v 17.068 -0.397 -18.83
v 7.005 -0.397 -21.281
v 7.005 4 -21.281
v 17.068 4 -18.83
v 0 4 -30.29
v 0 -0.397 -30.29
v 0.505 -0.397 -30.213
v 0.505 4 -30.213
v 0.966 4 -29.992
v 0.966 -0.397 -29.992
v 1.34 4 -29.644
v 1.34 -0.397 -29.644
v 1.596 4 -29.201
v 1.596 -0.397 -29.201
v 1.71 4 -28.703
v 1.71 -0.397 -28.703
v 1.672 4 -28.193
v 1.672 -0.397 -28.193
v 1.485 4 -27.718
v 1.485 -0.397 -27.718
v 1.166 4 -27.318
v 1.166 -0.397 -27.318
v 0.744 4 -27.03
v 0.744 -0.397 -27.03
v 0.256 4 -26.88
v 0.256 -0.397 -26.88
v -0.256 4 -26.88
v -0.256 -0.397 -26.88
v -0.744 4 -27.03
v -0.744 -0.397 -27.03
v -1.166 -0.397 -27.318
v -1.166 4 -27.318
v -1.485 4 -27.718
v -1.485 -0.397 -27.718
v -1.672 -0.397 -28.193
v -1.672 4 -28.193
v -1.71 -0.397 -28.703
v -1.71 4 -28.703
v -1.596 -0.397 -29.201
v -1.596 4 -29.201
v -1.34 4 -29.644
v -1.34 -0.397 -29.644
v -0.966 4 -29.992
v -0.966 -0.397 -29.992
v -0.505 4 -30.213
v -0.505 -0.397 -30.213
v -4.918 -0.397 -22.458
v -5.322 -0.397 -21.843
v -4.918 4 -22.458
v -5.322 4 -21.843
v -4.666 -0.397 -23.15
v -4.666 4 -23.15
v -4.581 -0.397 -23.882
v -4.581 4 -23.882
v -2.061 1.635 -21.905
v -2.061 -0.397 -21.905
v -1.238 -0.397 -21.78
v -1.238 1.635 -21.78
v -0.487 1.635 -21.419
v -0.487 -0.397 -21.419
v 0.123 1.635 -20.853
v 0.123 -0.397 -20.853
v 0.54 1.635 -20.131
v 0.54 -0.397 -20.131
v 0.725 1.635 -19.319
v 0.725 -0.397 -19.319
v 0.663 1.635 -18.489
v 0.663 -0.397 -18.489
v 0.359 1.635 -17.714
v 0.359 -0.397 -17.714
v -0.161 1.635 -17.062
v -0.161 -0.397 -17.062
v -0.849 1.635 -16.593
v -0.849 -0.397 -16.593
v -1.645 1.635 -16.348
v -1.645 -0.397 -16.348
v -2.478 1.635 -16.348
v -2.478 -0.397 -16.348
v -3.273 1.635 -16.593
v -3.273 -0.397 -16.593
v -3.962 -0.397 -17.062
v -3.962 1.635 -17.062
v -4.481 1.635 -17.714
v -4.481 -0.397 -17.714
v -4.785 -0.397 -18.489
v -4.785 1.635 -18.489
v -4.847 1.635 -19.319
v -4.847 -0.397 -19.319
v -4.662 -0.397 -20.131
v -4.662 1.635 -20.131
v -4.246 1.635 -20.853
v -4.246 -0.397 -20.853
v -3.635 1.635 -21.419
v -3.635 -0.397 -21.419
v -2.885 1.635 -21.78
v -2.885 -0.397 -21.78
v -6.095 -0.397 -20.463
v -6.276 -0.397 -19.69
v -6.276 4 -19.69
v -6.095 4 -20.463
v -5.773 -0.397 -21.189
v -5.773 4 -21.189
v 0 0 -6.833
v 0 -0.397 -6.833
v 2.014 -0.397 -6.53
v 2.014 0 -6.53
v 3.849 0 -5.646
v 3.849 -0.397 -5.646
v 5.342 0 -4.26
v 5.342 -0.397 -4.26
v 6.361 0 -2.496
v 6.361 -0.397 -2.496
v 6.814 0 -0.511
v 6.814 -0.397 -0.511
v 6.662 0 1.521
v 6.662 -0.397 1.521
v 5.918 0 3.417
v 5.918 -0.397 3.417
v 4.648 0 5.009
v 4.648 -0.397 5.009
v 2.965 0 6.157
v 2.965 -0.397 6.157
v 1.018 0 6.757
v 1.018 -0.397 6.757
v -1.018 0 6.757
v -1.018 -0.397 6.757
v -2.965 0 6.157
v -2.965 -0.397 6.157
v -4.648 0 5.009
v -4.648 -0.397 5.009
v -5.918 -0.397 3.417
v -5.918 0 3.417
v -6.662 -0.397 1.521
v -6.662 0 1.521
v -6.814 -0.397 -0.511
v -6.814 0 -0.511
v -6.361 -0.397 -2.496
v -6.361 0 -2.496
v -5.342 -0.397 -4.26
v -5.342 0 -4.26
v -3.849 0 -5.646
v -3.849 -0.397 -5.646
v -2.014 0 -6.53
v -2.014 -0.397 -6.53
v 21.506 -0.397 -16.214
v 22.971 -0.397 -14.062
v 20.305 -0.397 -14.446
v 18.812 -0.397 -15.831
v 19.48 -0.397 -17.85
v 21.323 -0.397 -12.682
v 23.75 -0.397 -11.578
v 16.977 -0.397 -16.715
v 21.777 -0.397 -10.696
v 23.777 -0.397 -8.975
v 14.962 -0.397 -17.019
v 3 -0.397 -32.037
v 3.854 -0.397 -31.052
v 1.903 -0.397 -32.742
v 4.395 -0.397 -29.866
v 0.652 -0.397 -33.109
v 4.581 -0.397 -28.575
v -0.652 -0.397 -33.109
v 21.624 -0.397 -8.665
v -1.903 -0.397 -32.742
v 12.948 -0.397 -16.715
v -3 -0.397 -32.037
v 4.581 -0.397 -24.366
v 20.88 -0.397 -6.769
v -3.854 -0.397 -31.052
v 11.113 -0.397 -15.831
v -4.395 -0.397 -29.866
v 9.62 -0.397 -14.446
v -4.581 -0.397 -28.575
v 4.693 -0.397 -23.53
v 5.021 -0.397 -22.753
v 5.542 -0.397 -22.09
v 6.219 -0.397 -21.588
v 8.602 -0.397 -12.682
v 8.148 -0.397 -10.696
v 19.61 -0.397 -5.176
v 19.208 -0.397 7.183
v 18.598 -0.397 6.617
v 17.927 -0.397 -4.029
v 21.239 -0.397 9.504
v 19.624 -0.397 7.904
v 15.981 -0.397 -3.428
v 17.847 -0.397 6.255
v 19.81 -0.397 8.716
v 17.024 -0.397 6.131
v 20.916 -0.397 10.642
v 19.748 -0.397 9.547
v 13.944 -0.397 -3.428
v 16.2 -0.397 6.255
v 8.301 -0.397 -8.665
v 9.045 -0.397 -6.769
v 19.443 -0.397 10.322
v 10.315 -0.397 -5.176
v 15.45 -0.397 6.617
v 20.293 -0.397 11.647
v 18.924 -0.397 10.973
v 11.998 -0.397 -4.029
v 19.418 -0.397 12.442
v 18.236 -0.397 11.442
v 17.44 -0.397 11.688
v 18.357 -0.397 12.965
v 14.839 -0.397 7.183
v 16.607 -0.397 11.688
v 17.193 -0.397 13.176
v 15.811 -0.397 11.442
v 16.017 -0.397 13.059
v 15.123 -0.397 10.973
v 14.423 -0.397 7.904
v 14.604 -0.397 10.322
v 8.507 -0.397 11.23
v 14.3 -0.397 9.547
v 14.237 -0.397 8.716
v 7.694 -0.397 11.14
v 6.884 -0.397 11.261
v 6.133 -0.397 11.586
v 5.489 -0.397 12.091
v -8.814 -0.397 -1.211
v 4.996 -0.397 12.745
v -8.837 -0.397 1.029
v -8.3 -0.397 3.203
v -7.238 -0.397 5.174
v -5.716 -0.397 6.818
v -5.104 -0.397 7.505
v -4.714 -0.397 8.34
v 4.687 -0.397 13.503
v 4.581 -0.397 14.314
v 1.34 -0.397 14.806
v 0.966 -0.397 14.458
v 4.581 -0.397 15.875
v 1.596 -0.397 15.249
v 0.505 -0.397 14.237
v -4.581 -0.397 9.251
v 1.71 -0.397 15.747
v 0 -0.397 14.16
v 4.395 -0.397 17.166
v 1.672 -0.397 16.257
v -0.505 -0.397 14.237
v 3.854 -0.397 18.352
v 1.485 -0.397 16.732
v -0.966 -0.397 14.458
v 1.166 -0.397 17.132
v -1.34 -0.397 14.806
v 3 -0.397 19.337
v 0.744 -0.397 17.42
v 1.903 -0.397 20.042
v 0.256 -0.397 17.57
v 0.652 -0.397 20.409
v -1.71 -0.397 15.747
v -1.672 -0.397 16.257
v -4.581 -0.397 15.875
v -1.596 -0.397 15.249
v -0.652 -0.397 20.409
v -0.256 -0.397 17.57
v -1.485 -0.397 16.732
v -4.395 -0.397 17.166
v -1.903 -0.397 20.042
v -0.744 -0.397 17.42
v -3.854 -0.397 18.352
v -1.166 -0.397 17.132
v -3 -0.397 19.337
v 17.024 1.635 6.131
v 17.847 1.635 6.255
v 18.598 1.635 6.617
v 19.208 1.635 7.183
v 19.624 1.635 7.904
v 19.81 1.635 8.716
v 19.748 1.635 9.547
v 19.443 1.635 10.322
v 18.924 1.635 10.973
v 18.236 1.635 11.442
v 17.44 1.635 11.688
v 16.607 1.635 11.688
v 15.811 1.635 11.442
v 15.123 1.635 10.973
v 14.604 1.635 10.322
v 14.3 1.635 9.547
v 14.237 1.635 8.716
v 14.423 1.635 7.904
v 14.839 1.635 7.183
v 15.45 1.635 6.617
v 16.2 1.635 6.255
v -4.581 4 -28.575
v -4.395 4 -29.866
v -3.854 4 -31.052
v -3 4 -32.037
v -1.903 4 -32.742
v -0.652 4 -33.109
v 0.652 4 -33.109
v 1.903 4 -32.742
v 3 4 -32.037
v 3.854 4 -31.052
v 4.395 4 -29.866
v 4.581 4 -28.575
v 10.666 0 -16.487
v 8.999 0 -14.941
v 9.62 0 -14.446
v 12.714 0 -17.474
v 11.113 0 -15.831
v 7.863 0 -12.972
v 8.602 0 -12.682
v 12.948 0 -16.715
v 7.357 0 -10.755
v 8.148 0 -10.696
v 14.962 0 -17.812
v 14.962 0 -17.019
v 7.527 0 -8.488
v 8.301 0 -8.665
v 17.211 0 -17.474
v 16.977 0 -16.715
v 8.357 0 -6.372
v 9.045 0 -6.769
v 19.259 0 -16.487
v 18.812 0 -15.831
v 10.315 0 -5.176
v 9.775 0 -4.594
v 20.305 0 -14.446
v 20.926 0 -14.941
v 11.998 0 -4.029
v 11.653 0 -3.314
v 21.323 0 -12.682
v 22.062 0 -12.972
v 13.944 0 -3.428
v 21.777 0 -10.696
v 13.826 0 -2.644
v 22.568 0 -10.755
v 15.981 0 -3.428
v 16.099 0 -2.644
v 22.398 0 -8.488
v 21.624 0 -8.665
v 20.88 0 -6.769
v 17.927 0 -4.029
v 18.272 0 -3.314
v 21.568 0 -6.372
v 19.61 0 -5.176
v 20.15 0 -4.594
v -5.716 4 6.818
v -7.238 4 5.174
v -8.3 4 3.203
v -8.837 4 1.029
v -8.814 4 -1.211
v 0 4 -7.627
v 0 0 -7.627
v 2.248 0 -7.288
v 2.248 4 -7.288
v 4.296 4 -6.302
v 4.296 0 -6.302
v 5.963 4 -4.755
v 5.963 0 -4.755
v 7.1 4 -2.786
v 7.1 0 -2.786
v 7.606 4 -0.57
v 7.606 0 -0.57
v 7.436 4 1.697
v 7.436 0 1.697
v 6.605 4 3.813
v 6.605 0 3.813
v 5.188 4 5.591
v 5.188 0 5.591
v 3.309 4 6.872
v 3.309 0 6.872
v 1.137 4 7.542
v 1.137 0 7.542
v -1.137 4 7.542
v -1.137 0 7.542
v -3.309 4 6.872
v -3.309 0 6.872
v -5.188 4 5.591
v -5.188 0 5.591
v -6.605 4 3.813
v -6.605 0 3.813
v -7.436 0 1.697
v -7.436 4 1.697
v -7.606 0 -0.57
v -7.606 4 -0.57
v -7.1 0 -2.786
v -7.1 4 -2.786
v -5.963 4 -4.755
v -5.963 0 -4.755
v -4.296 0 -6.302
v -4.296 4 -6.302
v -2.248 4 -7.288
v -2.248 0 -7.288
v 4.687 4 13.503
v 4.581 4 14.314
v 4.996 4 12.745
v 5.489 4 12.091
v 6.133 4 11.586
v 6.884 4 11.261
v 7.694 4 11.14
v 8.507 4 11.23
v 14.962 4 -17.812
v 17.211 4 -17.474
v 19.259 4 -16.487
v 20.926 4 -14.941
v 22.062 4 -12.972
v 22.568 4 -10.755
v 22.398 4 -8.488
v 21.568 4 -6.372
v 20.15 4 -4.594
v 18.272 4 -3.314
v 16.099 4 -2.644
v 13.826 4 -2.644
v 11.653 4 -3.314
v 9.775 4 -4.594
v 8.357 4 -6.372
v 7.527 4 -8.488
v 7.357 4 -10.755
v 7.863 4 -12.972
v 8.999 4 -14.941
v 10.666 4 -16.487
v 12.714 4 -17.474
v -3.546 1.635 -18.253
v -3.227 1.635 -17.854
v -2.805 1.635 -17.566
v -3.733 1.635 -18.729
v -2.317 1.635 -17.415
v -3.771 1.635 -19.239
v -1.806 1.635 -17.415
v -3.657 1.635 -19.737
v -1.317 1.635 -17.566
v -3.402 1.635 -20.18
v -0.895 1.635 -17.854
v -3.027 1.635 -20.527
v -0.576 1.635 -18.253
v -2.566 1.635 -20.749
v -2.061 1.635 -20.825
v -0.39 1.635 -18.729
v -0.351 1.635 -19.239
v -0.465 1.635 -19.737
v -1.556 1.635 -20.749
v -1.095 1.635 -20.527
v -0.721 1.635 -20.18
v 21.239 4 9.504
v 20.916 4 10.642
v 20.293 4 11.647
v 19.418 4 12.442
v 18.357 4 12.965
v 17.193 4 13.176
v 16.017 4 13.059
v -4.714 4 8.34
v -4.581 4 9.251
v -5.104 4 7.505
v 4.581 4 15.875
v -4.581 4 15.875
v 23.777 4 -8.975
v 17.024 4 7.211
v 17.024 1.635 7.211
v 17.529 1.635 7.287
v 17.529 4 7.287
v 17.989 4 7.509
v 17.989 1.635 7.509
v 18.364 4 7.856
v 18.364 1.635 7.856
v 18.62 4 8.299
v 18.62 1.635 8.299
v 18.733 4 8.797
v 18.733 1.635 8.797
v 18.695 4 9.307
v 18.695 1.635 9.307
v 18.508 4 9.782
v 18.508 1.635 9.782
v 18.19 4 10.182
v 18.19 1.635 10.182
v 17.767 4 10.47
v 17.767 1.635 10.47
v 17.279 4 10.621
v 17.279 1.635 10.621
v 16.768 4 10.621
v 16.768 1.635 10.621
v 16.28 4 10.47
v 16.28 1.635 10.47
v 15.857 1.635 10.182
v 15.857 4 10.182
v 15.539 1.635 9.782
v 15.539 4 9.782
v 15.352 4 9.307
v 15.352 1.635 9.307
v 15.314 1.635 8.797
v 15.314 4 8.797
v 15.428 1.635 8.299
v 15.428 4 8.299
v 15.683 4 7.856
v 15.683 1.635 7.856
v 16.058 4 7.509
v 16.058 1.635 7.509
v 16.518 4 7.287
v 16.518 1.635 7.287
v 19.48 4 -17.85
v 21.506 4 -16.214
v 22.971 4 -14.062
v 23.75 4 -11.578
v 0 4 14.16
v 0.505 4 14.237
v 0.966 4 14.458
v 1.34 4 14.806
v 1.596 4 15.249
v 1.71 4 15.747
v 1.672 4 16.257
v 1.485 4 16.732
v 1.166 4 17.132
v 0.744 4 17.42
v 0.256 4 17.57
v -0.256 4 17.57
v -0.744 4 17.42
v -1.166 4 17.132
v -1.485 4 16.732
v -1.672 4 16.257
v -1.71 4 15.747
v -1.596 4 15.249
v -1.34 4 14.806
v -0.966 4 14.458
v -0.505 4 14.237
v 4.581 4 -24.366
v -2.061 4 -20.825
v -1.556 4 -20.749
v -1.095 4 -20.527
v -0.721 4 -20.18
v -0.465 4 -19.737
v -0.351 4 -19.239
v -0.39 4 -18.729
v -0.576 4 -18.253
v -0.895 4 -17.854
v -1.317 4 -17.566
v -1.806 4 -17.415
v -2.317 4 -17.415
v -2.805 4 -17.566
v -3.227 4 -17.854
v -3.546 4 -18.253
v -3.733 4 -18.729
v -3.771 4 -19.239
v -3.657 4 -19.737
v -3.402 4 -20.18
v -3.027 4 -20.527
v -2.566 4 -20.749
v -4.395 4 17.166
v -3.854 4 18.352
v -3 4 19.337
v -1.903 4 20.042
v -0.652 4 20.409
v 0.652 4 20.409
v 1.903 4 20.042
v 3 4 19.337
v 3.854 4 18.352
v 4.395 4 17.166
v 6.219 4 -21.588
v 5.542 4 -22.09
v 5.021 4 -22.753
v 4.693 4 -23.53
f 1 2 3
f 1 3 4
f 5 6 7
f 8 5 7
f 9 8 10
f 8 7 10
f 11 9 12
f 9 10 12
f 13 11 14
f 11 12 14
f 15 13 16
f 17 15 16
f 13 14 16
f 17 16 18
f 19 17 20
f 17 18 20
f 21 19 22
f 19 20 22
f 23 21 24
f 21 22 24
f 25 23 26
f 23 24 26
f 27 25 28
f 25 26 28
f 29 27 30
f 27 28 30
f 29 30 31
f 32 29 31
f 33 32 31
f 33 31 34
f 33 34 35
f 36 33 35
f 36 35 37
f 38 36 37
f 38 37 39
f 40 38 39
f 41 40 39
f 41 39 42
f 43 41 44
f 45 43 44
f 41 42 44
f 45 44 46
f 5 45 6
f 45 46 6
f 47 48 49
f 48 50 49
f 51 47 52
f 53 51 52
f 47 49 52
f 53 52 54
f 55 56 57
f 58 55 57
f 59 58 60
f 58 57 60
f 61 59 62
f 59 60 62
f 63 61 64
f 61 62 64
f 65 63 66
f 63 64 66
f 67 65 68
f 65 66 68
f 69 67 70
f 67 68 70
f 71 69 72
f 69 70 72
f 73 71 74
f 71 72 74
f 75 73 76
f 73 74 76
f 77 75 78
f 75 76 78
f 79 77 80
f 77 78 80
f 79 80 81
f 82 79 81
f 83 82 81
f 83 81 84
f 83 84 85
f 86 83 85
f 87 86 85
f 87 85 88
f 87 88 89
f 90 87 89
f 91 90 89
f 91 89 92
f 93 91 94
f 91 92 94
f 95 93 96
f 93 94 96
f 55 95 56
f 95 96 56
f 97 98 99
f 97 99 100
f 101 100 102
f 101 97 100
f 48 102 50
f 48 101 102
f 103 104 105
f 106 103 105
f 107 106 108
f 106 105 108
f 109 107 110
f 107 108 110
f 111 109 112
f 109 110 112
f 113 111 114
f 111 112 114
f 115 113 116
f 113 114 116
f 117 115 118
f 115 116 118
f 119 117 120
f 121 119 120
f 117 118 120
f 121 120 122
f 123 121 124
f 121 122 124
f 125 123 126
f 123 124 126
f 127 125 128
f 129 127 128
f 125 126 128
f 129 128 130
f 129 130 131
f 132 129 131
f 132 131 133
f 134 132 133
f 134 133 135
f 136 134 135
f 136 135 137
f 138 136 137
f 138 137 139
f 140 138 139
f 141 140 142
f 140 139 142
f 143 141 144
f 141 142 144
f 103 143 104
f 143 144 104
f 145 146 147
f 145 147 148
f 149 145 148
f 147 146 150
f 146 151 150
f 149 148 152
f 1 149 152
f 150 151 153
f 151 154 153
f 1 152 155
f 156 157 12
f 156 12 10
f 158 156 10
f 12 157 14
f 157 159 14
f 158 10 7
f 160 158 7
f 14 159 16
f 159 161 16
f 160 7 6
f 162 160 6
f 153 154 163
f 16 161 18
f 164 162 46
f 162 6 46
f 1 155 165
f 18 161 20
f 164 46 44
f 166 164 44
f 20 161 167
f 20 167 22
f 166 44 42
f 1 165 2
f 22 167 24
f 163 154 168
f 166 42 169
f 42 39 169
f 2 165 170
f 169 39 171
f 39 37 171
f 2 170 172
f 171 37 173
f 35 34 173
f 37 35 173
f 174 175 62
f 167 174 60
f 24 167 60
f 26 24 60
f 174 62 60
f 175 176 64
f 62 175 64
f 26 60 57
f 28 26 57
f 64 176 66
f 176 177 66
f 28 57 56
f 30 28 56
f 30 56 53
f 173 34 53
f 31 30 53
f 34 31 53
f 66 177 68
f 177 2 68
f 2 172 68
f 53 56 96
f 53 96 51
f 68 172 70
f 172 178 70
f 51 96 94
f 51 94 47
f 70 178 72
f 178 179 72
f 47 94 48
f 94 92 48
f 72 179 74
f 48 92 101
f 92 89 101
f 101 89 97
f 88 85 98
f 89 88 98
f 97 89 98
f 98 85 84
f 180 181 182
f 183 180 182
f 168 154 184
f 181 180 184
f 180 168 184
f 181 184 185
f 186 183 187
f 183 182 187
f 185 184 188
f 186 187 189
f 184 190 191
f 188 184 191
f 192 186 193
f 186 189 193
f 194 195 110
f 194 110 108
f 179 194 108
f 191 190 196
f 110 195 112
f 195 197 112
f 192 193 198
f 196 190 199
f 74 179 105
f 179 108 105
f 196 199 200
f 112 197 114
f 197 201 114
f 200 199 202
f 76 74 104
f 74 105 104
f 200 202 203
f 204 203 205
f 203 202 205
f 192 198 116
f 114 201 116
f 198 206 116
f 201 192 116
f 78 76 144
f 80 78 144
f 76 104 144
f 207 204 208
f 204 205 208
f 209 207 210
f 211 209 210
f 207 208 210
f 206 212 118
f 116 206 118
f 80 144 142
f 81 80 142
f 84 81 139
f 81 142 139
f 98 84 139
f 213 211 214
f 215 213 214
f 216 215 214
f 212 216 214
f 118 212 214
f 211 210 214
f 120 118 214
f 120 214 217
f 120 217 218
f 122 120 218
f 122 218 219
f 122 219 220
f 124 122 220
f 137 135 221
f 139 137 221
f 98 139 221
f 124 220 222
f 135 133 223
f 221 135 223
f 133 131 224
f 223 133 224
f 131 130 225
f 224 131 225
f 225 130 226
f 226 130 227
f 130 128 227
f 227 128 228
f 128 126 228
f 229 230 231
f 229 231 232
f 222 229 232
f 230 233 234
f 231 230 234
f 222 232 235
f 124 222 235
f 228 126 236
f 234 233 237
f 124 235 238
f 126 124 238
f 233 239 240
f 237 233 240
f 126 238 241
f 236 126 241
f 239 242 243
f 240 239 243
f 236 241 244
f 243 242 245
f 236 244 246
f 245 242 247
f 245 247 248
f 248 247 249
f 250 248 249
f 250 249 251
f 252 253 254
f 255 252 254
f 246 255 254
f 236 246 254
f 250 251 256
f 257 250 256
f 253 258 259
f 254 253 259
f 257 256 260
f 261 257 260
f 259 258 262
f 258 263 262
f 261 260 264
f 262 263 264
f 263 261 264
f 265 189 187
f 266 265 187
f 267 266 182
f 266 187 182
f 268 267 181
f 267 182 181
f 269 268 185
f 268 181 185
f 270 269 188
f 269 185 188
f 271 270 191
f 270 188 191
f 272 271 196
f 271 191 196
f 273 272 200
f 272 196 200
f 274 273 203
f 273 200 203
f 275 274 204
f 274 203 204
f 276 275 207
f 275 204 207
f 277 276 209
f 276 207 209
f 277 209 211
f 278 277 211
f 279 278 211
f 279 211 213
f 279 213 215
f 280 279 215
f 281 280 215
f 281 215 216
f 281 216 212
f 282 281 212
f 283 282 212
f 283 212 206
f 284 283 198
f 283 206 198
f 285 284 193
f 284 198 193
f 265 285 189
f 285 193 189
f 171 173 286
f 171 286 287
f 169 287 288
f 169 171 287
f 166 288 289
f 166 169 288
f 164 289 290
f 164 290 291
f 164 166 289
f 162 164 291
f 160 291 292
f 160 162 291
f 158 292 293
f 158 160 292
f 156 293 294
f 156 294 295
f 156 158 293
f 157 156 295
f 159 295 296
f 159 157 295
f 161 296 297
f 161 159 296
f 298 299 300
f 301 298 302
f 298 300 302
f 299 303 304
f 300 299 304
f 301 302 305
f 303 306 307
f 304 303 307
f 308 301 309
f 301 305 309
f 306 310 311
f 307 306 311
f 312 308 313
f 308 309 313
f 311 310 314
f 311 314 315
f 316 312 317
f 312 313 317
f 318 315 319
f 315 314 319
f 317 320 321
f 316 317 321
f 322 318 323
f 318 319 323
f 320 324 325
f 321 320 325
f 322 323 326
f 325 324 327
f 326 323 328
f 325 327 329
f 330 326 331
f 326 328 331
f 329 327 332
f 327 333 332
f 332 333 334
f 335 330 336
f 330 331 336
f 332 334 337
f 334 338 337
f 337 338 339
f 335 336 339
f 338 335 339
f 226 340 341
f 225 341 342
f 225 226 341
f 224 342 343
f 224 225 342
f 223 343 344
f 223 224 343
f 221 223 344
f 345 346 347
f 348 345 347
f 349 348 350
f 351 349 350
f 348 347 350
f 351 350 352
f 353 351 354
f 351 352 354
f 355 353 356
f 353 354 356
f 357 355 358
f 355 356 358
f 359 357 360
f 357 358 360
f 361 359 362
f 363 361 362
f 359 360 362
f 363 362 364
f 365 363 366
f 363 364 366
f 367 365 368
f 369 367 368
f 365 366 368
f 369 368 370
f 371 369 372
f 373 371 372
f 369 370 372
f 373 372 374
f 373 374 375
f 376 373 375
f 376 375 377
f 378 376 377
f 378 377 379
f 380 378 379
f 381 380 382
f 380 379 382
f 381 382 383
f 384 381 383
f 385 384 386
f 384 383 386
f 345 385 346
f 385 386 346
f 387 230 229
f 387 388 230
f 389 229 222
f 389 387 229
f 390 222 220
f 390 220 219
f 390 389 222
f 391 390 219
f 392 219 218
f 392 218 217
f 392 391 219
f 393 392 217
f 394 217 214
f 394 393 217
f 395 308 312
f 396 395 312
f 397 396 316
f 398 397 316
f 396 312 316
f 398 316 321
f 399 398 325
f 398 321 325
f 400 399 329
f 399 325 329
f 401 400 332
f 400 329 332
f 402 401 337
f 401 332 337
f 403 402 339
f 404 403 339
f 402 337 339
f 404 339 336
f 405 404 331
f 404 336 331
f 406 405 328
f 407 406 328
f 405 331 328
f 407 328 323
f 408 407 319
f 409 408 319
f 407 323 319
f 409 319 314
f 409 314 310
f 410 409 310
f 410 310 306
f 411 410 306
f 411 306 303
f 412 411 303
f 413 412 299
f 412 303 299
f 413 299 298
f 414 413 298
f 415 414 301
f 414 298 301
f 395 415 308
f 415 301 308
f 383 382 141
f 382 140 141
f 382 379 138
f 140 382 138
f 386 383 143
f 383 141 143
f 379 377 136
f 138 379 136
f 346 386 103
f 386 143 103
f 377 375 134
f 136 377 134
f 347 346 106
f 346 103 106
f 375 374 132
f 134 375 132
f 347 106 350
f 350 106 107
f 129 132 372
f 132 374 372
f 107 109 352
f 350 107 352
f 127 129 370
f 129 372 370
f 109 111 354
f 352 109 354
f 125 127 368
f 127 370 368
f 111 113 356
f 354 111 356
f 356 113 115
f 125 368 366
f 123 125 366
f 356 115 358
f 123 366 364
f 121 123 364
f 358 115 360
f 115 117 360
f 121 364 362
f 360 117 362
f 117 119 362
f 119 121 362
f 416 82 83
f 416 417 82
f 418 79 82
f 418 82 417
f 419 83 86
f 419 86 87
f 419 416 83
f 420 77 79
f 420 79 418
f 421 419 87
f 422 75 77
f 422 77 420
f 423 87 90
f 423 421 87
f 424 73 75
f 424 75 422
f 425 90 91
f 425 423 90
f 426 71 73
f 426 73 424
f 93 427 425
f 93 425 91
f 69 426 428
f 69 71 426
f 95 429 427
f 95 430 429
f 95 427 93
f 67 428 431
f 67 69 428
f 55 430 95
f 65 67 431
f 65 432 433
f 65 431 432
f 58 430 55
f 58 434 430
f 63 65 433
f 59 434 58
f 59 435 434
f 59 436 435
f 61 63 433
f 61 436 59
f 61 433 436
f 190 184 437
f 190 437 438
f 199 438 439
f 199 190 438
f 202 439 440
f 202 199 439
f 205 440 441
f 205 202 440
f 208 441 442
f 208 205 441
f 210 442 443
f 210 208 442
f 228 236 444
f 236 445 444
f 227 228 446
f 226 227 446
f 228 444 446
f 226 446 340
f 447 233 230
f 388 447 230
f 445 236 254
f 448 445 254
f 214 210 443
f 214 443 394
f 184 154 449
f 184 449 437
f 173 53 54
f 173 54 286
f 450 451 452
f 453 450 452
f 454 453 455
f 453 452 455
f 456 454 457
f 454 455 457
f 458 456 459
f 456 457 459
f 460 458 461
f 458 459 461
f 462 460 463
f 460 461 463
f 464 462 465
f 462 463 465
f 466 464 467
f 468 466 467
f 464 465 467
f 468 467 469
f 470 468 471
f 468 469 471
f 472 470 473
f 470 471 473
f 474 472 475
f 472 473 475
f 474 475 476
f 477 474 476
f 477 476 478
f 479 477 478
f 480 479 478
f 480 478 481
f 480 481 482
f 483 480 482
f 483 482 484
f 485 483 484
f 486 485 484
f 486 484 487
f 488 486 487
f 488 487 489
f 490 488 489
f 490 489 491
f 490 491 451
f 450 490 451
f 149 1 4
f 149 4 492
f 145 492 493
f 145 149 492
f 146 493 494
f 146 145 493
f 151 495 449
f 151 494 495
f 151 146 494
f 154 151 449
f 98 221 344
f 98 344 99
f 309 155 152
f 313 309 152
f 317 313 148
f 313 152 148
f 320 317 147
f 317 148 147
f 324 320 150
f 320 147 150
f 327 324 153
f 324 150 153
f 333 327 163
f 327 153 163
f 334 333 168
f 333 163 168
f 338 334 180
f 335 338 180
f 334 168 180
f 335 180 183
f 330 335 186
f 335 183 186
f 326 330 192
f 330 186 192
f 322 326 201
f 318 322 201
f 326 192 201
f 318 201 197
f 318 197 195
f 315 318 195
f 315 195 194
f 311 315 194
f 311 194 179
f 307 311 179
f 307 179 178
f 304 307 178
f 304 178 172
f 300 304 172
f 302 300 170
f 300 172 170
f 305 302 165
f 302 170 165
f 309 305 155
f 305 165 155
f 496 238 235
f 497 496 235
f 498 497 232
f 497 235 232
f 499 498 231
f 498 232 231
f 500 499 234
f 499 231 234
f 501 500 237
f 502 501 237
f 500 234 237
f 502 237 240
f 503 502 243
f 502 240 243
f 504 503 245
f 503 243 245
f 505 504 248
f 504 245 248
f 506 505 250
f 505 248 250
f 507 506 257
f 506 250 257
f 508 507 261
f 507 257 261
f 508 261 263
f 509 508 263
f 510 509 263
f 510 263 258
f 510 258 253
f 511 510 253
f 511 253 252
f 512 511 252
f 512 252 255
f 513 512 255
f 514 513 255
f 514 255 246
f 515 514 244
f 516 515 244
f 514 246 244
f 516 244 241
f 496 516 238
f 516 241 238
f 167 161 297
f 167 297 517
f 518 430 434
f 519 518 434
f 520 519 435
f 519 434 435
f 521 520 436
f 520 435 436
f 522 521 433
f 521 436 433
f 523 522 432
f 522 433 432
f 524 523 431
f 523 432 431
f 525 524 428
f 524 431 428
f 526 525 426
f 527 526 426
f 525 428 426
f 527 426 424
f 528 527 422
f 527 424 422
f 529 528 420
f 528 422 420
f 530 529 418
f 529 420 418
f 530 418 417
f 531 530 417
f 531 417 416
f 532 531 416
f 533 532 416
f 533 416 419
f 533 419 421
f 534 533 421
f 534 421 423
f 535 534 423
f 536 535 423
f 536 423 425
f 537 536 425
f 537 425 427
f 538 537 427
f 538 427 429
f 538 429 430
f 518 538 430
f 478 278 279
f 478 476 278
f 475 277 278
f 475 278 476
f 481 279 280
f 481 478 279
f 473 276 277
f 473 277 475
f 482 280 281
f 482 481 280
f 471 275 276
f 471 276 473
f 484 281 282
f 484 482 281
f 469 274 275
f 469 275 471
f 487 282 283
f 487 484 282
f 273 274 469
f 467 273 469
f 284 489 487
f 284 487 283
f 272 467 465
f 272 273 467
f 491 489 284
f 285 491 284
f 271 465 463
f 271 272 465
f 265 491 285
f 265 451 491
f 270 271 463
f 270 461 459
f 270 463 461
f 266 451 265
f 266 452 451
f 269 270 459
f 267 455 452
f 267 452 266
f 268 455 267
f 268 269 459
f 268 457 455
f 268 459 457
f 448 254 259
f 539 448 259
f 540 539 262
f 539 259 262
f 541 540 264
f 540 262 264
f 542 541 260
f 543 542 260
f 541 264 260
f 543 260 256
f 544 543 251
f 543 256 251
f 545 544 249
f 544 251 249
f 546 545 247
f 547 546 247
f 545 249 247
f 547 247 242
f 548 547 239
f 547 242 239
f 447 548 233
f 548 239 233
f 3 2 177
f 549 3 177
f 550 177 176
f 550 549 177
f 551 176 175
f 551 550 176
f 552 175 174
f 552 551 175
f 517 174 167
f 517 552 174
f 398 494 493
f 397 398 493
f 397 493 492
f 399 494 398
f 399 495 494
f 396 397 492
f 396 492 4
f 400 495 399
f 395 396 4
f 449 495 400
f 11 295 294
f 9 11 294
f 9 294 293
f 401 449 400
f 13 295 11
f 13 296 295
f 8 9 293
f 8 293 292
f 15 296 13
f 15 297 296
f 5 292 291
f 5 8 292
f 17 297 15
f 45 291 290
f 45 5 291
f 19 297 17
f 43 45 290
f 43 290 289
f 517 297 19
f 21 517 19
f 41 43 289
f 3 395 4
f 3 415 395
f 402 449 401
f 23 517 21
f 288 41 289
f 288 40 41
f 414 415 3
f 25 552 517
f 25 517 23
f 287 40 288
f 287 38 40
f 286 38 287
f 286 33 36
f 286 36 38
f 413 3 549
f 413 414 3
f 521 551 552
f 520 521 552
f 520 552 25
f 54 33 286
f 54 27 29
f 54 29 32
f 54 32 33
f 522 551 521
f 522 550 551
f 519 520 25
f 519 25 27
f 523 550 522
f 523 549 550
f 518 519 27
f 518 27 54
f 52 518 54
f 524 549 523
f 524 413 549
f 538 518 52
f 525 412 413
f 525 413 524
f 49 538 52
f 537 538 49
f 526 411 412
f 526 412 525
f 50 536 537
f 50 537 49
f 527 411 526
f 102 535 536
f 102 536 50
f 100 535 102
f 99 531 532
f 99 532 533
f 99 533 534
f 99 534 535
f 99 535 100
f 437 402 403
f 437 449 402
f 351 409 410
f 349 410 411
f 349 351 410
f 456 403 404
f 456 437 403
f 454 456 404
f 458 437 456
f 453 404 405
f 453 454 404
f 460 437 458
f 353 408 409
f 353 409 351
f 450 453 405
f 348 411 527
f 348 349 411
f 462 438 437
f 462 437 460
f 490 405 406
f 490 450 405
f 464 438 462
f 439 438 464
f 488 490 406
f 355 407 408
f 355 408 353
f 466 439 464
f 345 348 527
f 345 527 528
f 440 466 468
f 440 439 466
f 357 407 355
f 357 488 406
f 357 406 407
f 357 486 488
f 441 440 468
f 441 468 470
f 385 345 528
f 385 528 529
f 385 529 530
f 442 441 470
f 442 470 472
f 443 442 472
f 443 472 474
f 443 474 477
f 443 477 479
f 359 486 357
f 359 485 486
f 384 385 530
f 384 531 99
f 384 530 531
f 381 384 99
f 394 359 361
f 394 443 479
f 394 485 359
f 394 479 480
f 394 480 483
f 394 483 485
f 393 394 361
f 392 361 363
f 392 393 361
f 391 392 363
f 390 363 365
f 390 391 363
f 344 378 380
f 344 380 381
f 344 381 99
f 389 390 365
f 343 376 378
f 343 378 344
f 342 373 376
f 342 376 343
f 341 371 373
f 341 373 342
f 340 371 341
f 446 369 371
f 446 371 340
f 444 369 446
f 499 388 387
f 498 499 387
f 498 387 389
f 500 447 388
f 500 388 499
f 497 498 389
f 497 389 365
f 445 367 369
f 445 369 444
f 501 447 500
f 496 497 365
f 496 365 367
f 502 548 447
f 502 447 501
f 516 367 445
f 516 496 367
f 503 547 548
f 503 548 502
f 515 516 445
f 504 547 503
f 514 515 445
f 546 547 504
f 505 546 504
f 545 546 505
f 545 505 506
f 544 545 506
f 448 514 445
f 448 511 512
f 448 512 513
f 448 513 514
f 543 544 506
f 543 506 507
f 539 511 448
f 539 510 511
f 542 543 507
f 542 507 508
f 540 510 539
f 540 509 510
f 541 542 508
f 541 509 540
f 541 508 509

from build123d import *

# Parameters (mm, degrees)
SKETCH1_R           = 7.626999986
SKETCH1_R_2         = 1.7145
BOSS_EXTRUDE1_DEPTH = 4.000000128
BOSS_EXTRUDE2_START = 0.396875
SKETCH2_R           = 6.833249986
BOSS_EXTRUDE2_DEPTH = 0.396875
SKETCH3_R           = 2.794
CUT_EXTRUDE1_DEPTH  = 2.032
SKETCH6_R           = 1.7145
BOSS_EXTRUDE5_DEPTH = 4.396875128
FILLET1_R           = 3.175


with BuildPart() as part:
    # Sketch1 → Boss-Extrude1 (new body)
    with BuildSketch(Plane(origin=(0, 0, 0), x_dir=(-1, 0, 0), z_dir=(0, -1, 0))):
        with BuildLine():
            Line((-21.238527151, -9.504108586), (-23.776738447, 8.97469386))
            ThreePointArc((-23.776738447, 8.97469386), (-22.317172851, 15.191935329), (-17.068206789, 18.829623948))
            Line((-17.068206789, 18.829623948), (1.054165054, 23.244178876))
            ThreePointArc((1.054165054, 23.244178876), (4.455202947, 22.62752212), (6.276027151, 19.689508586))
            Line((6.276027151, 19.689508586), (8.814238447, 1.21070614))
            ThreePointArc((8.814238447, 1.21070614), (7.354672851, -5.006535329), (2.105706789, -8.644223948))
            Line((2.105706789, -8.644223948), (-16.016665054, -13.058778876))
            ThreePointArc((-16.016665054, -13.058778876), (-19.417702947, -12.44212212), (-21.238527151, -9.504108586))
        make_face()
        with Locations(Location((-14.9625, 10.1854, 0), (0, 0, 90))):
            Circle(SKETCH1_R, mode=Mode.SUBTRACT)
        with Locations(Location((0, 0, 0), (0, 0, 90))):
            Circle(SKETCH1_R, mode=Mode.SUBTRACT)
        with Locations(Location((2.061103297, 19.110555087, 0), (0, 0, 90))):
            Circle(SKETCH1_R_2, mode=Mode.SUBTRACT)
        with Locations(Location((-17.023603297, -8.925155087, 0), (0, 0, 90))):
            Circle(SKETCH1_R_2, mode=Mode.SUBTRACT)
    extrude(amount=-BOSS_EXTRUDE1_DEPTH)

    # Sketch2 → Boss-Extrude2 (add)
    with BuildSketch(Plane.XZ.offset(BOSS_EXTRUDE2_START)):
        with BuildLine():
            Line((16.016665054, 13.058778876), (-2.105706789, 8.644223948))
            ThreePointArc((-2.105706789, 8.644223948), (-7.354672851, 5.006535329), (-8.814238447, -1.21070614))
            Line((-8.814238447, -1.21070614), (-6.276027151, -19.689508586))
            ThreePointArc((-6.276027151, -19.689508586), (-4.455202947, -22.62752212), (-1.054165054, -23.244178876))
            Line((-1.054165054, -23.244178876), (17.068206789, -18.829623948))
            ThreePointArc((17.068206789, -18.829623948), (22.317172851, -15.191935329), (23.776738447, -8.97469386))
            Line((23.776738447, -8.97469386), (21.238527151, 9.504108586))
            ThreePointArc((21.238527151, 9.504108586), (19.417702947, 12.44212212), (16.016665054, 13.058778876))
        make_face()
        with Locations(Location((14.9625, -10.1854, 0), (0, 0, 270))):
            Circle(SKETCH2_R, mode=Mode.SUBTRACT)
        with Locations(Location((0, 0, 0), (0, 0, 270))):
            Circle(SKETCH2_R, mode=Mode.SUBTRACT)
    extrude(amount=-BOSS_EXTRUDE2_DEPTH)

    # Sketch3 → Cut-Extrude1 (cut)
    with BuildSketch(Plane.XZ.offset(0.396875)):
        with Locations(Location((17.023603297, 8.925155087, 0), (0, 0, 270))):
            Circle(SKETCH3_R)
        with Locations(Location((-2.061103297, -19.110555087, 0), (0, 0, 270))):
            Circle(SKETCH3_R)
    extrude(amount=-CUT_EXTRUDE1_DEPTH, mode=Mode.SUBTRACT)

    # Sketch6 → Boss-Extrude5 (add)
    # profile 1 of 2: a face of its own
    with BuildSketch(Plane.XZ.offset(0.396875)):
        with BuildLine():
            Line((-4.580991155, 7.626999986), (-4.580991155, 15.875))
            ThreePointArc((-4.580991155, 15.875), (0, 20.455991155), (4.580991155, 15.875))
            Line((4.580991155, 15.875), (4.580991155, 10.273083328))
            Line((4.580991155, 10.273083328), (-2.105706789, 8.644223948))
            ThreePointArc((-2.105706789, 8.644223948), (-3.381814379, 8.229212614), (-4.580991155, 7.626999986))
        make_face()
        with Locations(Location((0, 15.875, 0), (0, 0, 270))):
            Circle(SKETCH6_R, mode=Mode.SUBTRACT)
    # profile 2 of 2: a face of its own
    with BuildSketch(Plane.XZ.offset(0.396875)):
        with BuildLine():
            Line((-4.580991155, -22.538518831), (-4.580991155, -28.575))
            ThreePointArc((-4.580991155, -28.575), (0, -33.155991155), (4.580991155, -28.575))
            Line((4.580991155, -28.575), (4.580991155, -21.87147188))
            Line((4.580991155, -21.87147188), (-1.054165054, -23.244178876))
            ThreePointArc((-1.054165054, -23.244178876), (-2.89581472, -23.282368493), (-4.580991155, -22.538518831))
        make_face()
        with Locations(Location((0, -28.575, 0), (0, 0, 270))):
            Circle(SKETCH6_R, mode=Mode.SUBTRACT)
    extrude(amount=-BOSS_EXTRUDE5_DEPTH)

    # Fillet1
    fillet1_edges = [part.edges().sort_by_distance(p)[0] for p in [
        (4.580991155, 1.801562564, 10.273083328),
        (-4.580991155, 1.801562564, 7.626999986),
        (4.580991155, 1.801562564, -21.87147188),
        (-4.580991155, 1.801562564, -22.538518831),
    ]]
    fillet(fillet1_edges, radius=FILLET1_R)


solid = part.part
